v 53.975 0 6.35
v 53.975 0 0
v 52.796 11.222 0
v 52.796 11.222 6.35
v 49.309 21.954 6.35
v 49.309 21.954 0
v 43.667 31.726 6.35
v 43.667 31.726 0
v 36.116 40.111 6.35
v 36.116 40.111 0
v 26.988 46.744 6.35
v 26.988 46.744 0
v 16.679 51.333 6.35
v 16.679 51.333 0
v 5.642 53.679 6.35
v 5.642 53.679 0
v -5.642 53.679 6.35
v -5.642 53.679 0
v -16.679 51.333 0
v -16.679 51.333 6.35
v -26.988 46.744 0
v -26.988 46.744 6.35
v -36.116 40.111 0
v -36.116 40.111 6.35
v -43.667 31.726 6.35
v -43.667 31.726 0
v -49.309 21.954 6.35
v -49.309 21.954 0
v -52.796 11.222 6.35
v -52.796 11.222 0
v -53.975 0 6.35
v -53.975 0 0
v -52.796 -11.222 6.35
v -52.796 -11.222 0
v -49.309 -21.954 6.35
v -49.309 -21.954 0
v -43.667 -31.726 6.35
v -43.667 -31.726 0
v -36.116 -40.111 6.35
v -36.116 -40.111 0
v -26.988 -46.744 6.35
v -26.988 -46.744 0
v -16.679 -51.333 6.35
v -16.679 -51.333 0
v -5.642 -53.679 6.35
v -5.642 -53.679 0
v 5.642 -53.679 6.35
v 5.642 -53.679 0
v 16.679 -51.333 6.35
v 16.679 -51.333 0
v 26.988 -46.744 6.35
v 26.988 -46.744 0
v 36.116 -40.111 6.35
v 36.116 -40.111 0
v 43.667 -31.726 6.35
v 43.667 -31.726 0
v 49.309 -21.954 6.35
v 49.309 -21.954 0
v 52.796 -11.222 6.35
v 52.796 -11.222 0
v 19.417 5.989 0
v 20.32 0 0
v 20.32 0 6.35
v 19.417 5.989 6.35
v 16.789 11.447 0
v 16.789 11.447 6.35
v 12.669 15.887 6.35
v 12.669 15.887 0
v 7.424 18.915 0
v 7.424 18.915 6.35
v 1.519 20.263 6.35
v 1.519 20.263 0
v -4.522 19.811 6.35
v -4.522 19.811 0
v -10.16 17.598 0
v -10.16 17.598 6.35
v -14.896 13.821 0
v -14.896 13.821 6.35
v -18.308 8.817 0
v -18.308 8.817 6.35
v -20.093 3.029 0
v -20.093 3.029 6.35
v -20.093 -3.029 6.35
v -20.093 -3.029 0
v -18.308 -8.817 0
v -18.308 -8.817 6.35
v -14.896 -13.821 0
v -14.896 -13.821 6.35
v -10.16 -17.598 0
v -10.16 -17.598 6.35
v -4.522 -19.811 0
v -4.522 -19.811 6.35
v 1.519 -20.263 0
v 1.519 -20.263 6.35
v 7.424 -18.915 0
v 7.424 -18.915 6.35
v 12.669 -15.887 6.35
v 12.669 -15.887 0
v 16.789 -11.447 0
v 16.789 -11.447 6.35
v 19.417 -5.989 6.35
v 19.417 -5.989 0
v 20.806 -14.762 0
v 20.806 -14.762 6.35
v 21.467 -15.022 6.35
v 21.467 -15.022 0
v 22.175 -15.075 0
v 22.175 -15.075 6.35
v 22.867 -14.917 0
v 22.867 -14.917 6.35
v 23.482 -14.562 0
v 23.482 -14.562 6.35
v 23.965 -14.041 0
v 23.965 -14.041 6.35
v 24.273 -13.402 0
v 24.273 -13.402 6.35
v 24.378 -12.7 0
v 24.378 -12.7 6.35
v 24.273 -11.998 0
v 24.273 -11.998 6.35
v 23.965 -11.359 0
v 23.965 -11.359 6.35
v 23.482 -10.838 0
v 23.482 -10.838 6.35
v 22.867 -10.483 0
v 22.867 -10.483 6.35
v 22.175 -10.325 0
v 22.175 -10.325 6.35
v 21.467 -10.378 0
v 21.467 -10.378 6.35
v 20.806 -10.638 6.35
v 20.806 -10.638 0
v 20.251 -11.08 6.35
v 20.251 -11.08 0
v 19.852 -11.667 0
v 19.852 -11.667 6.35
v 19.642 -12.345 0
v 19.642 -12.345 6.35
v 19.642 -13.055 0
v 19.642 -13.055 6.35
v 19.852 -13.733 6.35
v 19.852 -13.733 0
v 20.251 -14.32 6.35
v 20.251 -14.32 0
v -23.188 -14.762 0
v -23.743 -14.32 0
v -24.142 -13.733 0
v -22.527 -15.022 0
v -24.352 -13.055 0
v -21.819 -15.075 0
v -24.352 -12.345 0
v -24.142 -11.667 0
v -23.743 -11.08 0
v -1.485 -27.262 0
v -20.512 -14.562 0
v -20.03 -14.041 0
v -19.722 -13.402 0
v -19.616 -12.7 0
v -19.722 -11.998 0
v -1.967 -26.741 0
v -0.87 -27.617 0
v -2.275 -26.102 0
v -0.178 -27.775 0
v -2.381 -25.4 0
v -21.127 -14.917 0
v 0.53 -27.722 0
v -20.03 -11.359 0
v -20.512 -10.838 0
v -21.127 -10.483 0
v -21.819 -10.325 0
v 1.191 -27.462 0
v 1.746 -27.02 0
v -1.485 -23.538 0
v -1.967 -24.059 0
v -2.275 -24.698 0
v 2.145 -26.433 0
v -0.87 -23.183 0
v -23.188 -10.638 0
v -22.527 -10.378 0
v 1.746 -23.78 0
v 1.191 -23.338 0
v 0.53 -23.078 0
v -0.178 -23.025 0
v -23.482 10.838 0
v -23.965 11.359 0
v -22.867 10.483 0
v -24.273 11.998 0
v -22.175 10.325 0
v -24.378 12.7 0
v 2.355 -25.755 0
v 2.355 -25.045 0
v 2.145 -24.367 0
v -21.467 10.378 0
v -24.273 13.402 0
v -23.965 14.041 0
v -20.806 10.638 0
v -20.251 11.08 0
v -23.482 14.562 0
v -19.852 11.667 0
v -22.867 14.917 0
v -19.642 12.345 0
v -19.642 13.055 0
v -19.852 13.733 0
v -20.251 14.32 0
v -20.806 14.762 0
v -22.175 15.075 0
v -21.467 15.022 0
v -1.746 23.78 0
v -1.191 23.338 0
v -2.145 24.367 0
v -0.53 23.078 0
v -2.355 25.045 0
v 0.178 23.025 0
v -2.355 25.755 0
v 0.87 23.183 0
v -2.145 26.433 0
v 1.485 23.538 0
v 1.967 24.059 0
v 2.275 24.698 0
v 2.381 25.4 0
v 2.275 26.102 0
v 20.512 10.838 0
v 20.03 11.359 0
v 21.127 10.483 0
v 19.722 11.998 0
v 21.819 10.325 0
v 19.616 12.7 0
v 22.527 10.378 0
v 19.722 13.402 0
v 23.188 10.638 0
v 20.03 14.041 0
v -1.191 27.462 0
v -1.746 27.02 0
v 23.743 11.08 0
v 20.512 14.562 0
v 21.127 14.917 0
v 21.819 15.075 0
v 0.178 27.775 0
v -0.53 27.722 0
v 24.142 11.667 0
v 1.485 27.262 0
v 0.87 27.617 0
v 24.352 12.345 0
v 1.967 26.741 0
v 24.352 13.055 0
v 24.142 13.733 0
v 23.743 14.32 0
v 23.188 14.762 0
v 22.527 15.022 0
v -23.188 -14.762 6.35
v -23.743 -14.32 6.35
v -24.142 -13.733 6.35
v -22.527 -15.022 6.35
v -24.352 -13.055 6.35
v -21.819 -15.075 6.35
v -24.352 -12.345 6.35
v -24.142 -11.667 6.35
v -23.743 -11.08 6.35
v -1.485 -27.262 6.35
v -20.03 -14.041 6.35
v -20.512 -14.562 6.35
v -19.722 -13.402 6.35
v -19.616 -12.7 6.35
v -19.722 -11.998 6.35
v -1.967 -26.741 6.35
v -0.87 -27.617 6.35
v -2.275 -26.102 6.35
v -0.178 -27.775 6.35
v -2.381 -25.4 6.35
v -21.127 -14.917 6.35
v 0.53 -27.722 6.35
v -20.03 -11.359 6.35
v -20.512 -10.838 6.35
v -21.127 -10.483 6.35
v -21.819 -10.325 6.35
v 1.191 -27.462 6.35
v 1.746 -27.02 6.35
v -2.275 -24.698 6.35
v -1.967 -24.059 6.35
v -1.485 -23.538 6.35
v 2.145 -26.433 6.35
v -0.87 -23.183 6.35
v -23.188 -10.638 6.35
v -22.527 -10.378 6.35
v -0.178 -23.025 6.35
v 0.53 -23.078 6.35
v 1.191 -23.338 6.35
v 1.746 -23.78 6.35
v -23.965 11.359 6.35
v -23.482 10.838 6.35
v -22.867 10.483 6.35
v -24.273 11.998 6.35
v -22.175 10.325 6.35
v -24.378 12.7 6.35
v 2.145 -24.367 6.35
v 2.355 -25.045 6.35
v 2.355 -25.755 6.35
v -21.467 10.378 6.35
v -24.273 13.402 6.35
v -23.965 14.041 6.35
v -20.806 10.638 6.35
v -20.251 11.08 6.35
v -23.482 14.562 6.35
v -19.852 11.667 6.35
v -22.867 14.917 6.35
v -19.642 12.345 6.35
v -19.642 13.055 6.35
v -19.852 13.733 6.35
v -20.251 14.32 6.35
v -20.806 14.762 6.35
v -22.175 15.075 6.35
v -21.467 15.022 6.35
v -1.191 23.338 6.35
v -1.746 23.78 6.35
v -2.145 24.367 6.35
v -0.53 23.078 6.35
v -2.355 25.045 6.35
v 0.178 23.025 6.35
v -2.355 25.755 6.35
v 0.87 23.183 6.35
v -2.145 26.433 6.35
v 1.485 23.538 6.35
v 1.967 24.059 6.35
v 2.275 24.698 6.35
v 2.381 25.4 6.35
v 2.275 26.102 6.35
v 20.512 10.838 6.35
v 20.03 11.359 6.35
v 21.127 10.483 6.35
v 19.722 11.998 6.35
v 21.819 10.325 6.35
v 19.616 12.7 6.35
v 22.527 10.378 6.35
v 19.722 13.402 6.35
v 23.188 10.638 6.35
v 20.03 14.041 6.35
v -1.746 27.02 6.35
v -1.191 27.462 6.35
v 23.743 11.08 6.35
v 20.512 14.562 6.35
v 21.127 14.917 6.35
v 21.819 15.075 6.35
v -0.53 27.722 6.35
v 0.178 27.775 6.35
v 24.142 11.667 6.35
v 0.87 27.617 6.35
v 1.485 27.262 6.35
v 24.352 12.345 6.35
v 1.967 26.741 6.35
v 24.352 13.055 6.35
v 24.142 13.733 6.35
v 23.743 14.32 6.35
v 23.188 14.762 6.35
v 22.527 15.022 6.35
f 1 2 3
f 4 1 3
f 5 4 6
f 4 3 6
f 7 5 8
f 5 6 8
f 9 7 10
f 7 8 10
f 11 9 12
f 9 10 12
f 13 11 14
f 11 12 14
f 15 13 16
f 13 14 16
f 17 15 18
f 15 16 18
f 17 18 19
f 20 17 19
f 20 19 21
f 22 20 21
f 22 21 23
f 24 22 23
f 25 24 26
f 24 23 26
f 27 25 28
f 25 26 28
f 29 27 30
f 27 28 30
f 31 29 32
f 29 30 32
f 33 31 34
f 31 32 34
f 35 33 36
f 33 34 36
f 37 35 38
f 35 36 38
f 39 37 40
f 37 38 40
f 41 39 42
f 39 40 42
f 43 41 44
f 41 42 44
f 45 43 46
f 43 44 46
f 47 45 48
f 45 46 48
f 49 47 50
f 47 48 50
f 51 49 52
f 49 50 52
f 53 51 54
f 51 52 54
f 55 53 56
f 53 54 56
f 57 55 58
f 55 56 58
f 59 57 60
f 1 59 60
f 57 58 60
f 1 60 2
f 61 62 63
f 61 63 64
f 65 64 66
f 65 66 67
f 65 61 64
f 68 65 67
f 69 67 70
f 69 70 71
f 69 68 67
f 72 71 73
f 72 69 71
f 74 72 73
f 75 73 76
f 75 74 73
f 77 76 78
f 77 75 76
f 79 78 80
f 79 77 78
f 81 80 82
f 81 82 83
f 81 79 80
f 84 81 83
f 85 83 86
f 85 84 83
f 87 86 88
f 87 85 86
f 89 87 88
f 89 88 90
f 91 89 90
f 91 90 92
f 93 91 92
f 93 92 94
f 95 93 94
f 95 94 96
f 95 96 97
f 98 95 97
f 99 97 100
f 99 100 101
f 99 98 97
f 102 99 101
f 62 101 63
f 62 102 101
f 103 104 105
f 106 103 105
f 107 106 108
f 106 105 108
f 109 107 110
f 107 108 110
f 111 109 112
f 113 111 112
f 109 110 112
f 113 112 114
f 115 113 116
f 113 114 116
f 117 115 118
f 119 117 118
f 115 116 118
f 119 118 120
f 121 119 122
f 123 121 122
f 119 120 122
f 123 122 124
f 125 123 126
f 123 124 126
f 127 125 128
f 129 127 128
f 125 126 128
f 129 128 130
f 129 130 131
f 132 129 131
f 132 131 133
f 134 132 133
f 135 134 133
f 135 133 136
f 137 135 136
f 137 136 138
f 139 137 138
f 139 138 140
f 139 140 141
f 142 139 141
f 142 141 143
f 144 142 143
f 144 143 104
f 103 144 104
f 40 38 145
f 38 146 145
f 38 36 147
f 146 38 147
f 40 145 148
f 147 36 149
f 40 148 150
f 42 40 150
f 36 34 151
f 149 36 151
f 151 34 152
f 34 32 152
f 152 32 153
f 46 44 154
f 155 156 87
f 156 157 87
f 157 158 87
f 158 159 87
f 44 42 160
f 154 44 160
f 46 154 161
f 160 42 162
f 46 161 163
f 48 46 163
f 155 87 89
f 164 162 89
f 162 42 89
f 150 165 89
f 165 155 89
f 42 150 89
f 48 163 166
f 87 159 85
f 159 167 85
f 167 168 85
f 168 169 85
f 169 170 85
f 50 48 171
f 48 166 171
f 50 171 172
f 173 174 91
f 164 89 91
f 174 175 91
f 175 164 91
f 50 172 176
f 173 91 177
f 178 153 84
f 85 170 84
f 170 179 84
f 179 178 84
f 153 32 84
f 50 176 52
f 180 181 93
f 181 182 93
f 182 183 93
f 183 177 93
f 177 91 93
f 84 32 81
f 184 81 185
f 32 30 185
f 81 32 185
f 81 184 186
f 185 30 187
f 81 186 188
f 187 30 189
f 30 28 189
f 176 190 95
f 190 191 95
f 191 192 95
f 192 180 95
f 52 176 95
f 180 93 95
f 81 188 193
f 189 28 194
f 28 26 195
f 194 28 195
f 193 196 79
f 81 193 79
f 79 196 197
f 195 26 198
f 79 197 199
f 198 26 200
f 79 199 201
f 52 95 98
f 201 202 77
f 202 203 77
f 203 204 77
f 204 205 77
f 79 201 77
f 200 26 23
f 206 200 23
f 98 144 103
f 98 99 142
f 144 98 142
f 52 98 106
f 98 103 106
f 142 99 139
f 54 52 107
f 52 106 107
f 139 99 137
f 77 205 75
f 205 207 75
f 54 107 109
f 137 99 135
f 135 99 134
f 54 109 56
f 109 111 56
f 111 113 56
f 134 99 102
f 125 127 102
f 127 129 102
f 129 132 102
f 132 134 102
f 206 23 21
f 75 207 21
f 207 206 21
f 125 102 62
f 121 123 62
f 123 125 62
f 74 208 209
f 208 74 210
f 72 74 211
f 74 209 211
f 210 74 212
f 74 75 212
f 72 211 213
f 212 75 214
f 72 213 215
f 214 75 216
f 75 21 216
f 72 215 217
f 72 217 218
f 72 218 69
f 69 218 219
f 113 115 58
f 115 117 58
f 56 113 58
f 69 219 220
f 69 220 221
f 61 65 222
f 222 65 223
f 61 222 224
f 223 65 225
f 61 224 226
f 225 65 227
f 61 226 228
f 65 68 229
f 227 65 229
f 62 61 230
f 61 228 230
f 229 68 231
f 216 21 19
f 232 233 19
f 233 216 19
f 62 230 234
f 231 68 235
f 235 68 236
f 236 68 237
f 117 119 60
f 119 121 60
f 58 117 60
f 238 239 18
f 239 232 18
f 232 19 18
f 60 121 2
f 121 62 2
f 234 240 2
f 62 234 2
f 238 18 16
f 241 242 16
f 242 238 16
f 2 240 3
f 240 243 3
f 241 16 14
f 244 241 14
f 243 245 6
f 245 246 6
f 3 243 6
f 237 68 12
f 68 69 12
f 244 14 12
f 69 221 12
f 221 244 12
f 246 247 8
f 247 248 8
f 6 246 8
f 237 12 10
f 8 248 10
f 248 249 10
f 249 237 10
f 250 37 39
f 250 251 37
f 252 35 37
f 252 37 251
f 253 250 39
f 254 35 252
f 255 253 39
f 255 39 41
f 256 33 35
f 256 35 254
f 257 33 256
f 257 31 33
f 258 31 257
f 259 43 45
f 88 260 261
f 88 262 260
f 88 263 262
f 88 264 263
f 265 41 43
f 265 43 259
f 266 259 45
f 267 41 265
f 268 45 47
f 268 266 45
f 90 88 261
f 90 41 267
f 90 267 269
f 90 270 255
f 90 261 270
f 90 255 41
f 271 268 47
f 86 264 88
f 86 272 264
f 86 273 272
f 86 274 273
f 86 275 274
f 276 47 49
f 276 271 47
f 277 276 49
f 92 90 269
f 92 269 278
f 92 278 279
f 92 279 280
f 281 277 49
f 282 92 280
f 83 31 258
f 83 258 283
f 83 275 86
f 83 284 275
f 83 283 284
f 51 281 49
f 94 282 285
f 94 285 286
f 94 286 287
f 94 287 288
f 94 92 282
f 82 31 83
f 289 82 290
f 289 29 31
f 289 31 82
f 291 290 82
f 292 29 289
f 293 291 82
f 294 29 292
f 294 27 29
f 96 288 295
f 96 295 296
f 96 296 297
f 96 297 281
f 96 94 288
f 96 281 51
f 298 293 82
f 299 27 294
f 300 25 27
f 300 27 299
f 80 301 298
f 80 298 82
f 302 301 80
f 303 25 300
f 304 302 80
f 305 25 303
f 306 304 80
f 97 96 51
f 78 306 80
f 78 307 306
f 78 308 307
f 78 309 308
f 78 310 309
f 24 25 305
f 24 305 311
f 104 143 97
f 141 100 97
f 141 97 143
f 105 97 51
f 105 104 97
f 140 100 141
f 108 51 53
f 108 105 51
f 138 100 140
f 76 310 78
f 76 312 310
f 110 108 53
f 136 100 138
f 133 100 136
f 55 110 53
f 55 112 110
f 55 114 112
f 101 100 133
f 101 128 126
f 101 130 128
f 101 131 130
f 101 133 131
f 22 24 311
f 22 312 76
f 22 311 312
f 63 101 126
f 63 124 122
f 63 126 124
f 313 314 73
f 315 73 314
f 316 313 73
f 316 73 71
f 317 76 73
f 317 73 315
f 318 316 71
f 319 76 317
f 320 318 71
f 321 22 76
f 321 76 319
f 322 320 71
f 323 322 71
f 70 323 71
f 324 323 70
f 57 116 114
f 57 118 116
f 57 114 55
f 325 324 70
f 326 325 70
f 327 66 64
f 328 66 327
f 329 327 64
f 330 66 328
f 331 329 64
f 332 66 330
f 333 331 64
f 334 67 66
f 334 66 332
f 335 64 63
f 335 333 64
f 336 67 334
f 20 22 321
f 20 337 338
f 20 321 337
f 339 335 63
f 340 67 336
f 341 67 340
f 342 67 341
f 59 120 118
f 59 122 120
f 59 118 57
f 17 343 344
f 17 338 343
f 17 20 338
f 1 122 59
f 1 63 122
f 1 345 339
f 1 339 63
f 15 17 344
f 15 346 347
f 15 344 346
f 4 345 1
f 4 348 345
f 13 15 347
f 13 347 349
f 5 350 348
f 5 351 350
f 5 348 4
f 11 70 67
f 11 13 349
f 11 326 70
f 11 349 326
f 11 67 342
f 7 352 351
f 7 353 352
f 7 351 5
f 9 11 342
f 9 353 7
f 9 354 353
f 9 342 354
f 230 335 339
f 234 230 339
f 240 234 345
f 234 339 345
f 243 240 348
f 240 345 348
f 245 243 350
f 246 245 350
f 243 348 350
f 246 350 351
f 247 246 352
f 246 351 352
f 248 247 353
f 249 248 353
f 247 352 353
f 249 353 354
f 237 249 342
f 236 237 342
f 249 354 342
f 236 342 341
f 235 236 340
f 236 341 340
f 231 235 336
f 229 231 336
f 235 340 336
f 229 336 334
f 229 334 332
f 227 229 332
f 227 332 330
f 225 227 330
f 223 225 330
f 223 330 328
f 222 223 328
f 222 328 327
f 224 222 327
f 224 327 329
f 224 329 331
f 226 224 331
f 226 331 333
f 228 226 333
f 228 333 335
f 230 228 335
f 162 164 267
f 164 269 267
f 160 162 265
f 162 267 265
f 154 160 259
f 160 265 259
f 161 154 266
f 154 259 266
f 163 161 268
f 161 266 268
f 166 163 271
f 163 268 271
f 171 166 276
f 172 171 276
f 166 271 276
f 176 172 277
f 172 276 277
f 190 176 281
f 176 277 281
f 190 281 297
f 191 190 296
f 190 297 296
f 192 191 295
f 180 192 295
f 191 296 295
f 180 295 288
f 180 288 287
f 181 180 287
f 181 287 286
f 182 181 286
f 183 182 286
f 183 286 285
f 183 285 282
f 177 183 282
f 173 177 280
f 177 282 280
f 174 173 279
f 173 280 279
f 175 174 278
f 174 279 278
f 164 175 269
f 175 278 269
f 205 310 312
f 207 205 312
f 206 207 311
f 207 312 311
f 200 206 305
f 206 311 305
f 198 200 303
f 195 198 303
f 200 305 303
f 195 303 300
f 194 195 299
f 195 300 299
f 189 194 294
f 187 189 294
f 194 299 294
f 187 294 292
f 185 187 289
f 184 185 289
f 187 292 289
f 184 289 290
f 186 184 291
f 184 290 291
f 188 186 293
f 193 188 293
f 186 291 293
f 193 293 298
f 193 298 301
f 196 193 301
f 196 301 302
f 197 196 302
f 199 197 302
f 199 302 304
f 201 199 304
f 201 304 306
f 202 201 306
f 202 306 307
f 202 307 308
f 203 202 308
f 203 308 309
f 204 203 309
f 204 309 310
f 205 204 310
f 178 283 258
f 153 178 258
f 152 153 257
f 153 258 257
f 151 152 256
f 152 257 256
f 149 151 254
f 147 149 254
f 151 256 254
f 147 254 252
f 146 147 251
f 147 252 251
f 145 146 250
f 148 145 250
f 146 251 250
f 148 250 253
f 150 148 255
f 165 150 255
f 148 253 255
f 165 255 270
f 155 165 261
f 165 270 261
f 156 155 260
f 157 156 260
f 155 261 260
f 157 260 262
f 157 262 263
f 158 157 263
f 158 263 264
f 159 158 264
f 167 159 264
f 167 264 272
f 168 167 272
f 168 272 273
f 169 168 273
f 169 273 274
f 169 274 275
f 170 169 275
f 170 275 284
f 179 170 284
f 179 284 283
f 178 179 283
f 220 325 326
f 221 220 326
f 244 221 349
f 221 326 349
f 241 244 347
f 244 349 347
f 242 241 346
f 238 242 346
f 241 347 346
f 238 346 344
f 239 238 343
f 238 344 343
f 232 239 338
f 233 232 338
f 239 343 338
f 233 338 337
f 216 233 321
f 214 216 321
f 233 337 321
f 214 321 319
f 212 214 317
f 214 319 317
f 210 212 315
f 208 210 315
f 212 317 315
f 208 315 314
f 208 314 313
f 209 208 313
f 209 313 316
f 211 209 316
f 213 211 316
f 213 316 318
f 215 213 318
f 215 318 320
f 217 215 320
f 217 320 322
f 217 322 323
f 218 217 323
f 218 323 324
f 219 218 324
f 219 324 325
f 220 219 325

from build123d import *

# Parameters (mm, degrees)
F0_R            = 53.975
F0_R_2          = 20.32
F1_DEPTH        = 6.35
F2_D            = 4.7625
F2_DEPTH        = 6.35
F2_TIP          = 1.4307993491
F2_COPIES_COUNT = 6


# Not quite as in the source:
# - a pattern or mirror of a feature is missing from the dataset's text; its kind, count and spacing are read off the source's solid


with BuildPart() as f1:
    # F0 (on Top) → F1 (new body)
    with BuildSketch(Plane.XY):
        Circle(F0_R)
        Circle(F0_R_2, mode=Mode.SUBTRACT)
    extrude(amount=F1_DEPTH)

    # F2
    with Locations(Plane(origin=(0, 0, 0), x_dir=(1, 0, 0), z_dir=(0, 0, -1))):
        with Locations((0, 25.4)):
            f2 = Hole(F2_D / 2, depth=F2_DEPTH)
            with Locations((0, 0, -(F2_DEPTH + F2_TIP / 2))):  # 118° drill point
                Cone(0, F2_D / 2, F2_TIP, mode=Mode.SUBTRACT)

    # F2_copies: F2 ×6 about axis
    f2_copies_axis = Axis((0, 0, 0), (0, 0, 1))
    for i in range(1, F2_COPIES_COUNT):
        add(f2.rotate(f2_copies_axis, i * 360 / F2_COPIES_COUNT), mode=Mode.SUBTRACT)


solid = f1.part
